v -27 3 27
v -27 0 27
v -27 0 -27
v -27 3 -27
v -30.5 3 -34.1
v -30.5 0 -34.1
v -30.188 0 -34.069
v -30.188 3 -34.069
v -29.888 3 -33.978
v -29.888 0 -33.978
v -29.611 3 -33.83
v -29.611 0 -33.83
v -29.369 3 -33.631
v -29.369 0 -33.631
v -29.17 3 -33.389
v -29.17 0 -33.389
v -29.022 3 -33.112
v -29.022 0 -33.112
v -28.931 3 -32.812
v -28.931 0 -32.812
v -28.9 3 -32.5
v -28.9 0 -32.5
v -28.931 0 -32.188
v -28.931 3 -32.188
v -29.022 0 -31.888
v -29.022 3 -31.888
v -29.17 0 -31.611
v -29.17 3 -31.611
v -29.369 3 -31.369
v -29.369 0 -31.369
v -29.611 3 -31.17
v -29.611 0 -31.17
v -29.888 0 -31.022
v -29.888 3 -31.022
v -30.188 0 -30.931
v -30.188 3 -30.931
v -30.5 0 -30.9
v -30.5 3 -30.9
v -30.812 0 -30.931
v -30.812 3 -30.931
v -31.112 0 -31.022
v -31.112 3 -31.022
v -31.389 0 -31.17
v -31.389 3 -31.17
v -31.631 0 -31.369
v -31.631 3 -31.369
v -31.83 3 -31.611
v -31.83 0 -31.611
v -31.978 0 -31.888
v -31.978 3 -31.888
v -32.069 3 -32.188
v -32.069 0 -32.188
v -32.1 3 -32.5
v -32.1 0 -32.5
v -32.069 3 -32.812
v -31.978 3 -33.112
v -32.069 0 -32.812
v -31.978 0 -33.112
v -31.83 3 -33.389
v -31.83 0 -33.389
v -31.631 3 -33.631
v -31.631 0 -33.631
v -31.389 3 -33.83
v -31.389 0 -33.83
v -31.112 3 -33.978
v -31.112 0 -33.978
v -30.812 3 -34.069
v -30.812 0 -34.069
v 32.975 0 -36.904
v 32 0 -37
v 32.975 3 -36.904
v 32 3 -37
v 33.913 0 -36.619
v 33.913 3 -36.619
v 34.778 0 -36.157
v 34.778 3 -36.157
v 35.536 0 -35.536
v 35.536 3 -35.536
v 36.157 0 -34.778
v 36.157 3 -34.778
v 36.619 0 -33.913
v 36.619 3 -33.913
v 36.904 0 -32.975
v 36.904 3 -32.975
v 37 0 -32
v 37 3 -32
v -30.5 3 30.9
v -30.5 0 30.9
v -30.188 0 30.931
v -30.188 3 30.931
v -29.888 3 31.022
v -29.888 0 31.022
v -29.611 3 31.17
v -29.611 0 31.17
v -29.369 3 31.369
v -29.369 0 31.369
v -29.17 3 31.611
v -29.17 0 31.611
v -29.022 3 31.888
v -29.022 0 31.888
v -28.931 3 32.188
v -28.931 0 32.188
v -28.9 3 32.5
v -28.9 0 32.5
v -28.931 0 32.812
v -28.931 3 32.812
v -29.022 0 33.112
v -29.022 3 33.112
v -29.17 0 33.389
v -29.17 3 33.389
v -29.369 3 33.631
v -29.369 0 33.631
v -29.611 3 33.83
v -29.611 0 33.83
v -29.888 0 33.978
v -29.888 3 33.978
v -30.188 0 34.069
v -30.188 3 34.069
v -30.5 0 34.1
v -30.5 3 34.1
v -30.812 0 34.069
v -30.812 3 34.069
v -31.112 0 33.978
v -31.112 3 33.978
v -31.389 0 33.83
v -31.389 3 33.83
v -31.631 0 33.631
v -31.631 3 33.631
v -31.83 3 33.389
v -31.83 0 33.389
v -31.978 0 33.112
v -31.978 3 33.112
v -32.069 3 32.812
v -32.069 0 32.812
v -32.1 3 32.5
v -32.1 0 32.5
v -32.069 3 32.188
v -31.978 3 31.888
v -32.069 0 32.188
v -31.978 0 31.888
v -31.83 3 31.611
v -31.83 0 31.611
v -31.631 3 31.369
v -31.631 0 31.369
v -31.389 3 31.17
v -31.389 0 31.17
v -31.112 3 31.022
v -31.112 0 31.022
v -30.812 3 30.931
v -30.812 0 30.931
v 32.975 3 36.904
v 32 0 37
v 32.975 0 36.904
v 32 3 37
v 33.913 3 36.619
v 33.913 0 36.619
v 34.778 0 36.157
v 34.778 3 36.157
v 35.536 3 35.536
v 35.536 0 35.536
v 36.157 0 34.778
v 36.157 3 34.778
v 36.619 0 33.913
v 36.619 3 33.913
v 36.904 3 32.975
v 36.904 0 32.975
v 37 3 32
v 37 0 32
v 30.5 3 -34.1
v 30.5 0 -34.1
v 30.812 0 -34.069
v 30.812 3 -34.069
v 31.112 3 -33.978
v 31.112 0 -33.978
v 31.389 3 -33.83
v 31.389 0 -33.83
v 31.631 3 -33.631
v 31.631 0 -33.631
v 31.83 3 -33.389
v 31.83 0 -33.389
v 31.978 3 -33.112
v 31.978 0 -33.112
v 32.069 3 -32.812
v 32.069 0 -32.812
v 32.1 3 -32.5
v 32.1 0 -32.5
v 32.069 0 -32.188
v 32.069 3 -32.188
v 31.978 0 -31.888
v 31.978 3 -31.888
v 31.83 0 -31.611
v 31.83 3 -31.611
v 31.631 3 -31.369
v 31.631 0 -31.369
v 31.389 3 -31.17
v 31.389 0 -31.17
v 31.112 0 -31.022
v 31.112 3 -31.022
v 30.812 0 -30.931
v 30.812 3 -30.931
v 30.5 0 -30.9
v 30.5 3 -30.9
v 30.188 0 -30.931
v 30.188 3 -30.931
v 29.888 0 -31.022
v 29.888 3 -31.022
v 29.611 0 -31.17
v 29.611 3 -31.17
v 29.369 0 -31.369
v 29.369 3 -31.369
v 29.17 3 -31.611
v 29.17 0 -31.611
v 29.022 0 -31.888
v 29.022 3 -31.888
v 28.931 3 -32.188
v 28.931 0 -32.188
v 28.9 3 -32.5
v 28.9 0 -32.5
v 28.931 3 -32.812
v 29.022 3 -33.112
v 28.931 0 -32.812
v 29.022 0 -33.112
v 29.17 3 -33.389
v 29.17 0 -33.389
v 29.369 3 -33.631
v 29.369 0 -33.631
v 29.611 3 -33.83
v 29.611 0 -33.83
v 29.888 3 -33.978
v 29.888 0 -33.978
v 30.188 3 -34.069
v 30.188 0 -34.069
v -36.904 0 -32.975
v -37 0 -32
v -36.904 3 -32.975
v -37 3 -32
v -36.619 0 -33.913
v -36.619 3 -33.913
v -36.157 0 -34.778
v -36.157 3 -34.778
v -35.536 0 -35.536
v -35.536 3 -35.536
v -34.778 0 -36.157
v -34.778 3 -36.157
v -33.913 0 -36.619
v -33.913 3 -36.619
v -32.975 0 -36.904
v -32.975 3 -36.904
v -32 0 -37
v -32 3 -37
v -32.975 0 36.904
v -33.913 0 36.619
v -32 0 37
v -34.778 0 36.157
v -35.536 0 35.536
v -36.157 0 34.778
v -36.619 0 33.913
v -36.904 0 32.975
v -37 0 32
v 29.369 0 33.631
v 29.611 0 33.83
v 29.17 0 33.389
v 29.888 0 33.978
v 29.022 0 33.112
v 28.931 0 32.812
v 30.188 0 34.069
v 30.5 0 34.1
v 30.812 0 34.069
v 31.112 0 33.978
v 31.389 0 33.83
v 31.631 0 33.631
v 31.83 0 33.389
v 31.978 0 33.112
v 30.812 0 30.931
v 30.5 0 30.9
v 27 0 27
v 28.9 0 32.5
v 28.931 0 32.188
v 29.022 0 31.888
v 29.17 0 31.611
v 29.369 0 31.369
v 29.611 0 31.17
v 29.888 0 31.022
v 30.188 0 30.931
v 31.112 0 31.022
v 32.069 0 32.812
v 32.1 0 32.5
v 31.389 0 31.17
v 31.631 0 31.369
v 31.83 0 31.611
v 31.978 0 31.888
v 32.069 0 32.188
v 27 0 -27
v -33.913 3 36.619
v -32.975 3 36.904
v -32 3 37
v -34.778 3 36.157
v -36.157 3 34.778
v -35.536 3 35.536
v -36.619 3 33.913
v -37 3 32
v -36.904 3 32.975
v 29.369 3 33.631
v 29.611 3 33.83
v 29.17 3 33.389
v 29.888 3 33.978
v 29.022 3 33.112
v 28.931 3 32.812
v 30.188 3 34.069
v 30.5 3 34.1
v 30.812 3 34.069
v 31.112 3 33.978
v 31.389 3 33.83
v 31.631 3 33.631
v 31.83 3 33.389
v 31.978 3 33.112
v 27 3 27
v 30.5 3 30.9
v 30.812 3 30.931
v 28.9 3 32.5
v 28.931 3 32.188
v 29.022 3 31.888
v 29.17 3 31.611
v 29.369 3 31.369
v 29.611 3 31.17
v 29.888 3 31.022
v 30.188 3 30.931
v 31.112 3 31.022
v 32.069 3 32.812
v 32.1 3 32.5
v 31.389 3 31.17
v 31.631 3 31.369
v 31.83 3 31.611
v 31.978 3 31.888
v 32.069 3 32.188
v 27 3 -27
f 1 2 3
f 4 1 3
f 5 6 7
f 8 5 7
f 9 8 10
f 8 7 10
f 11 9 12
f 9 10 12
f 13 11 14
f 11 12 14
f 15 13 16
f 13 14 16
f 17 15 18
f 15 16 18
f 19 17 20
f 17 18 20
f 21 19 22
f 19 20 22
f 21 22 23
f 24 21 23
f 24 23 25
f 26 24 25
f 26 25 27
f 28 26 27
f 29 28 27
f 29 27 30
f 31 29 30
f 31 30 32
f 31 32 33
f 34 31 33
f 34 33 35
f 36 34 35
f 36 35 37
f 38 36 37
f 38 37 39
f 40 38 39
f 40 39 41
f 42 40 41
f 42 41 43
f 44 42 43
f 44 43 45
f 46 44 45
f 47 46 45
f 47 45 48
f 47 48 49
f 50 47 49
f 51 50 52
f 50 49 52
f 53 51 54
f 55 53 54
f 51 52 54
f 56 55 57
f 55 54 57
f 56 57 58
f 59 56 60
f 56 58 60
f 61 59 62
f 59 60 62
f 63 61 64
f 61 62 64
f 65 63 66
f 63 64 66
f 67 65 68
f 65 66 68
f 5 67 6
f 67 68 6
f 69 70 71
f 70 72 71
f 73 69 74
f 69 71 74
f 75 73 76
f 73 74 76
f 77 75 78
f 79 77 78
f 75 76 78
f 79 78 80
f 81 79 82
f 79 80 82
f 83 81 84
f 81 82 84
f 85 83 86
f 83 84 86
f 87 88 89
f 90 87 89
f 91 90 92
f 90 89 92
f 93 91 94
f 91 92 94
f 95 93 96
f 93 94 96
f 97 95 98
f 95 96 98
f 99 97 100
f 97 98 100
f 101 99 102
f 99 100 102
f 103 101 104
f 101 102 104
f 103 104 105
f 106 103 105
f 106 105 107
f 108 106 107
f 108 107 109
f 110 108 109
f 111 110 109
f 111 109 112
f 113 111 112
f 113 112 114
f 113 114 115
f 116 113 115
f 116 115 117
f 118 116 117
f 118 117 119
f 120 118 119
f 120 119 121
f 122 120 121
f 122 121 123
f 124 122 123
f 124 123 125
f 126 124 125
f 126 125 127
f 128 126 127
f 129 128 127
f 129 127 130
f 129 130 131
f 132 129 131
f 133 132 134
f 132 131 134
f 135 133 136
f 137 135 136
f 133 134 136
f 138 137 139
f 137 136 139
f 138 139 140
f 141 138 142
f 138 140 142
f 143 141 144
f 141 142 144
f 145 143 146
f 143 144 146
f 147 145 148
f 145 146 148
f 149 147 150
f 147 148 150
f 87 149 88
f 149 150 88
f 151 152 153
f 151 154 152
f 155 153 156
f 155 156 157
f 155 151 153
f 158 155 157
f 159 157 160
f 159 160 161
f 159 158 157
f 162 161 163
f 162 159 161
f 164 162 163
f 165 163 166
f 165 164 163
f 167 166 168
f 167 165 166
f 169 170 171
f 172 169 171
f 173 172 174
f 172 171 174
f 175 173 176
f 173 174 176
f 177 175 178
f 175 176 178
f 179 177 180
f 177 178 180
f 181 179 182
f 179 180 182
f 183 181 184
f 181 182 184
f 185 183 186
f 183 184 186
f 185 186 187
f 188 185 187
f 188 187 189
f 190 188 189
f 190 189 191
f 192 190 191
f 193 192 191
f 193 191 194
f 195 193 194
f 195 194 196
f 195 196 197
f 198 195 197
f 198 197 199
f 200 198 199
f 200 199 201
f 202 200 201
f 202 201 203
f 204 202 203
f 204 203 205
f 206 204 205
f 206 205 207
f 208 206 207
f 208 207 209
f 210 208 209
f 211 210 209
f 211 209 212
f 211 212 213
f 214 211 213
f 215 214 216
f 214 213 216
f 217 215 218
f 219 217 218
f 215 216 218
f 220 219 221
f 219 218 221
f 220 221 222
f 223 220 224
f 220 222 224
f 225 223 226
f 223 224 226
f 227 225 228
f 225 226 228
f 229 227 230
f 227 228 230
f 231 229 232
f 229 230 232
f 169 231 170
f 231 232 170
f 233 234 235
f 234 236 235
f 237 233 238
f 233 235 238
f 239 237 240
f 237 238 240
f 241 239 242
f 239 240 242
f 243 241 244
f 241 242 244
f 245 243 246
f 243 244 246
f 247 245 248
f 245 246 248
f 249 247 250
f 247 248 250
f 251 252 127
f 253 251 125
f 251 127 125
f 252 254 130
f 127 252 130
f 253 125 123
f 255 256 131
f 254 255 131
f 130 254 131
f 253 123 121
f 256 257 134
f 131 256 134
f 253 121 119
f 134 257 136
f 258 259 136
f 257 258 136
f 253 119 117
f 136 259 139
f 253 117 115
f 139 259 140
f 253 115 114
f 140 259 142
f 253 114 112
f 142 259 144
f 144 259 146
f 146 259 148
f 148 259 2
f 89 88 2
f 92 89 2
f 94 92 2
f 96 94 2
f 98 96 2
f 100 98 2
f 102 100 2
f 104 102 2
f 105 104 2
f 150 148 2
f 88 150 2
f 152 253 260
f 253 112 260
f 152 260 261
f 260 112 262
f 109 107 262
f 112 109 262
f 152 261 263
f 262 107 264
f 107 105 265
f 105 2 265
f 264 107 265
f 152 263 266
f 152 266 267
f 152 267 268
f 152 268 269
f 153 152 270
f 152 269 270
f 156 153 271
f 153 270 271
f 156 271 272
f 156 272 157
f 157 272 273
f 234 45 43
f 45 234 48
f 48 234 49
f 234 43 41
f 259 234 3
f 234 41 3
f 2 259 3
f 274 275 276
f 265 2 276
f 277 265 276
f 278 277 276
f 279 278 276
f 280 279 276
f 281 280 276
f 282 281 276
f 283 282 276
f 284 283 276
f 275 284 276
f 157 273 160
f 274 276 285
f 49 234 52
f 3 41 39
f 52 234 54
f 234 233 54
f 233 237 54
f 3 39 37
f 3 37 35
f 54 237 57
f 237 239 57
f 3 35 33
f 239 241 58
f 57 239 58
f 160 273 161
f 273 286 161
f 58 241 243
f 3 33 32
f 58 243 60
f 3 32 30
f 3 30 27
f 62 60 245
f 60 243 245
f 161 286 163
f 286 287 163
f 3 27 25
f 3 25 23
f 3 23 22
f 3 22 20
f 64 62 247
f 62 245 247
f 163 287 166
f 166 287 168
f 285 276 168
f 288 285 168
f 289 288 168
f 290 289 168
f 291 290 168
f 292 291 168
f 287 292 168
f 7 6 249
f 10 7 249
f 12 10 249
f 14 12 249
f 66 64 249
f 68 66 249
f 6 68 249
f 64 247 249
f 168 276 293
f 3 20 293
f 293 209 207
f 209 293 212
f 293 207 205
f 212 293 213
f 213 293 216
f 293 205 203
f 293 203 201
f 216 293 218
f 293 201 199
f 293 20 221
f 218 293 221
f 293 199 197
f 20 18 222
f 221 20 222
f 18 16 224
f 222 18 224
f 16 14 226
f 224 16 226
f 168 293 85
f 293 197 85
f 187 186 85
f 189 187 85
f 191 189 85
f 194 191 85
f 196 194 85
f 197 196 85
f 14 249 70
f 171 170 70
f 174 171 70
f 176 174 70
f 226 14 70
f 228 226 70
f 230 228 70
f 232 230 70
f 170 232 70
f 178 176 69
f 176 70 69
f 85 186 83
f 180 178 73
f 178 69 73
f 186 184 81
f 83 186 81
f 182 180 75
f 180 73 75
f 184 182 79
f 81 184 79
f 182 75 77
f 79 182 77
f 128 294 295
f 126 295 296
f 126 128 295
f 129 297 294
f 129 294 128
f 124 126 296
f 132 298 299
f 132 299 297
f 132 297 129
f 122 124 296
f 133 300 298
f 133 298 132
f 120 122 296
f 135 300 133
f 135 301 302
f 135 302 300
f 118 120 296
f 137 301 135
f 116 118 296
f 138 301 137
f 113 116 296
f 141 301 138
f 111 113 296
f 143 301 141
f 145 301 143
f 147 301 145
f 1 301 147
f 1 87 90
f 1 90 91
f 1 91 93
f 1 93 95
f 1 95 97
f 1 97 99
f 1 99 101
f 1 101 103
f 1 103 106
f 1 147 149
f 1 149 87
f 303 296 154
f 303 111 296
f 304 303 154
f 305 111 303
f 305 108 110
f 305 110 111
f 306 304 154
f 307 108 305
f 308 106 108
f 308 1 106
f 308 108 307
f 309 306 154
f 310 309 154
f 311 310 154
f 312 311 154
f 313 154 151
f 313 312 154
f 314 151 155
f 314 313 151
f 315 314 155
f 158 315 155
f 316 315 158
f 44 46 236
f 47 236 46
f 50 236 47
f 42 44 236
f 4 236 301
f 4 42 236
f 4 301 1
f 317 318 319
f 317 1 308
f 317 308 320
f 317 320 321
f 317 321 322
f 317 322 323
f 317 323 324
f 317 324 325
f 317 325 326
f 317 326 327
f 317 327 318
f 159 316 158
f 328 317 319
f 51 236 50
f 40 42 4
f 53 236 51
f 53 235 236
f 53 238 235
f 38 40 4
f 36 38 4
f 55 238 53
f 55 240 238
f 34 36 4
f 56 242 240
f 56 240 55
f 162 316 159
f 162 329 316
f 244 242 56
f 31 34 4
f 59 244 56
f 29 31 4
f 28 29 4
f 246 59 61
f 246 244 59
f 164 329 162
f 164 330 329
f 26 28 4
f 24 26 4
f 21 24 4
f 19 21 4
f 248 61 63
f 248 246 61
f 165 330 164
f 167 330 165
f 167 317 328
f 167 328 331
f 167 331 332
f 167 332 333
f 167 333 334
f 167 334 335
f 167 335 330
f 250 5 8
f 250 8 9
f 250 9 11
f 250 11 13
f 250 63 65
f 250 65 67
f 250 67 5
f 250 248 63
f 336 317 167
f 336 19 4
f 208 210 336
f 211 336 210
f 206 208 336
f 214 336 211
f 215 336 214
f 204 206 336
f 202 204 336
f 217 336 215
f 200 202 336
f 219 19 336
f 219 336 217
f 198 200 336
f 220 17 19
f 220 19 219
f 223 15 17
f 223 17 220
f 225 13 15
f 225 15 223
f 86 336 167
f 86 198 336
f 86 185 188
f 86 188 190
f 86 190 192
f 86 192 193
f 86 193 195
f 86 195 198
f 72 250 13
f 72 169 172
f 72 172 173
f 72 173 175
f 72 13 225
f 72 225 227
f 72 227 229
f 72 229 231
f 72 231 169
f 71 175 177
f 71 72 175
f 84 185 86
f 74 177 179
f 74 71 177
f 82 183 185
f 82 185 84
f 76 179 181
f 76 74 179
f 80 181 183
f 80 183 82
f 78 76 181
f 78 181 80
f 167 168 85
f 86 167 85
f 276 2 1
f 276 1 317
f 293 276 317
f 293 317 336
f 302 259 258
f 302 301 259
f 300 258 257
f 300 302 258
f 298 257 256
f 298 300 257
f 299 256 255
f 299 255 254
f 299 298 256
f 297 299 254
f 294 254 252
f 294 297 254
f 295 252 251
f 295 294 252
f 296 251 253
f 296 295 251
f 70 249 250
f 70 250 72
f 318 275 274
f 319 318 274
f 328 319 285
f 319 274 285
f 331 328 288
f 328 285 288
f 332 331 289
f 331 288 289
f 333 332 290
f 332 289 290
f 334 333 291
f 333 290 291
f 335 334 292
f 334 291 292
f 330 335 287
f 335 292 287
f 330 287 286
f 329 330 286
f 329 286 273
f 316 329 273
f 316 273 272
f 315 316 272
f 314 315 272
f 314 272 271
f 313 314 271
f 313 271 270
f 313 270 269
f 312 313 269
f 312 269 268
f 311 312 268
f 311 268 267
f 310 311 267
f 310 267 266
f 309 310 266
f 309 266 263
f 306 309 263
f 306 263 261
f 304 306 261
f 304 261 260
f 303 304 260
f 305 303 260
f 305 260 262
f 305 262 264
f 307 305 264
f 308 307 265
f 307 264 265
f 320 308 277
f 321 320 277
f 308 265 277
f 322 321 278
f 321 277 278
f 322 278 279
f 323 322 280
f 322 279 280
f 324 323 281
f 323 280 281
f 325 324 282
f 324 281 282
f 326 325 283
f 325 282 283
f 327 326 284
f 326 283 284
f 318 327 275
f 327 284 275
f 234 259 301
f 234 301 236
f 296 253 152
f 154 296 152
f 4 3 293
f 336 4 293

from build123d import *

# Parameters (mm, degrees)
SKETCH1_W                = 74
SKETCH1_H                = 74
SKETCH1_W_2              = 54
SKETCH1_H_2              = 54
BOSS_EXTRUDE1_DEPTH      = 3
M3_CLEARANCE_HOLE1_D     = 3.2
M3_CLEARANCE_HOLE1_DEPTH = 4.5
M3_CLEARANCE_HOLE1_TIP   = 0.96137699
FILLET1_R                = 5


with BuildPart() as part:
    # Sketch1 → Boss-Extrude1 (new body)
    with BuildSketch(Plane(origin=(0, 0, 0), x_dir=(1, 0, 0), z_dir=(0, 1, 0))):
        Rectangle(SKETCH1_W, SKETCH1_H)
        Rectangle(SKETCH1_W_2, SKETCH1_H_2, mode=Mode.SUBTRACT)
    extrude(amount=BOSS_EXTRUDE1_DEPTH)

    # M3 Clearance Hole1
    with Locations(Plane(origin=(-30.5, 3, -32.5), x_dir=(0, 0, 1), z_dir=(0, 1, 0))):
        with Locations((0, 0), (0, 61), (65, 61), (65, 0)):
            Hole(M3_CLEARANCE_HOLE1_D / 2, depth=M3_CLEARANCE_HOLE1_DEPTH)
            with Locations((0, 0, -(M3_CLEARANCE_HOLE1_DEPTH + M3_CLEARANCE_HOLE1_TIP / 2))):  # 118° drill point
                Cone(0, M3_CLEARANCE_HOLE1_D / 2, M3_CLEARANCE_HOLE1_TIP, mode=Mode.SUBTRACT)

    # Fillet1
    fillet1_edges = [part.edges().sort_by_distance(p)[0] for p in [
        (37, 1.5, 37),
        (-37, 1.5, 37),
        (-37, 1.5, -37),
        (37, 1.5, -37),
    ]]
    fillet(fillet1_edges, radius=FILLET1_R)


solid = part.part
